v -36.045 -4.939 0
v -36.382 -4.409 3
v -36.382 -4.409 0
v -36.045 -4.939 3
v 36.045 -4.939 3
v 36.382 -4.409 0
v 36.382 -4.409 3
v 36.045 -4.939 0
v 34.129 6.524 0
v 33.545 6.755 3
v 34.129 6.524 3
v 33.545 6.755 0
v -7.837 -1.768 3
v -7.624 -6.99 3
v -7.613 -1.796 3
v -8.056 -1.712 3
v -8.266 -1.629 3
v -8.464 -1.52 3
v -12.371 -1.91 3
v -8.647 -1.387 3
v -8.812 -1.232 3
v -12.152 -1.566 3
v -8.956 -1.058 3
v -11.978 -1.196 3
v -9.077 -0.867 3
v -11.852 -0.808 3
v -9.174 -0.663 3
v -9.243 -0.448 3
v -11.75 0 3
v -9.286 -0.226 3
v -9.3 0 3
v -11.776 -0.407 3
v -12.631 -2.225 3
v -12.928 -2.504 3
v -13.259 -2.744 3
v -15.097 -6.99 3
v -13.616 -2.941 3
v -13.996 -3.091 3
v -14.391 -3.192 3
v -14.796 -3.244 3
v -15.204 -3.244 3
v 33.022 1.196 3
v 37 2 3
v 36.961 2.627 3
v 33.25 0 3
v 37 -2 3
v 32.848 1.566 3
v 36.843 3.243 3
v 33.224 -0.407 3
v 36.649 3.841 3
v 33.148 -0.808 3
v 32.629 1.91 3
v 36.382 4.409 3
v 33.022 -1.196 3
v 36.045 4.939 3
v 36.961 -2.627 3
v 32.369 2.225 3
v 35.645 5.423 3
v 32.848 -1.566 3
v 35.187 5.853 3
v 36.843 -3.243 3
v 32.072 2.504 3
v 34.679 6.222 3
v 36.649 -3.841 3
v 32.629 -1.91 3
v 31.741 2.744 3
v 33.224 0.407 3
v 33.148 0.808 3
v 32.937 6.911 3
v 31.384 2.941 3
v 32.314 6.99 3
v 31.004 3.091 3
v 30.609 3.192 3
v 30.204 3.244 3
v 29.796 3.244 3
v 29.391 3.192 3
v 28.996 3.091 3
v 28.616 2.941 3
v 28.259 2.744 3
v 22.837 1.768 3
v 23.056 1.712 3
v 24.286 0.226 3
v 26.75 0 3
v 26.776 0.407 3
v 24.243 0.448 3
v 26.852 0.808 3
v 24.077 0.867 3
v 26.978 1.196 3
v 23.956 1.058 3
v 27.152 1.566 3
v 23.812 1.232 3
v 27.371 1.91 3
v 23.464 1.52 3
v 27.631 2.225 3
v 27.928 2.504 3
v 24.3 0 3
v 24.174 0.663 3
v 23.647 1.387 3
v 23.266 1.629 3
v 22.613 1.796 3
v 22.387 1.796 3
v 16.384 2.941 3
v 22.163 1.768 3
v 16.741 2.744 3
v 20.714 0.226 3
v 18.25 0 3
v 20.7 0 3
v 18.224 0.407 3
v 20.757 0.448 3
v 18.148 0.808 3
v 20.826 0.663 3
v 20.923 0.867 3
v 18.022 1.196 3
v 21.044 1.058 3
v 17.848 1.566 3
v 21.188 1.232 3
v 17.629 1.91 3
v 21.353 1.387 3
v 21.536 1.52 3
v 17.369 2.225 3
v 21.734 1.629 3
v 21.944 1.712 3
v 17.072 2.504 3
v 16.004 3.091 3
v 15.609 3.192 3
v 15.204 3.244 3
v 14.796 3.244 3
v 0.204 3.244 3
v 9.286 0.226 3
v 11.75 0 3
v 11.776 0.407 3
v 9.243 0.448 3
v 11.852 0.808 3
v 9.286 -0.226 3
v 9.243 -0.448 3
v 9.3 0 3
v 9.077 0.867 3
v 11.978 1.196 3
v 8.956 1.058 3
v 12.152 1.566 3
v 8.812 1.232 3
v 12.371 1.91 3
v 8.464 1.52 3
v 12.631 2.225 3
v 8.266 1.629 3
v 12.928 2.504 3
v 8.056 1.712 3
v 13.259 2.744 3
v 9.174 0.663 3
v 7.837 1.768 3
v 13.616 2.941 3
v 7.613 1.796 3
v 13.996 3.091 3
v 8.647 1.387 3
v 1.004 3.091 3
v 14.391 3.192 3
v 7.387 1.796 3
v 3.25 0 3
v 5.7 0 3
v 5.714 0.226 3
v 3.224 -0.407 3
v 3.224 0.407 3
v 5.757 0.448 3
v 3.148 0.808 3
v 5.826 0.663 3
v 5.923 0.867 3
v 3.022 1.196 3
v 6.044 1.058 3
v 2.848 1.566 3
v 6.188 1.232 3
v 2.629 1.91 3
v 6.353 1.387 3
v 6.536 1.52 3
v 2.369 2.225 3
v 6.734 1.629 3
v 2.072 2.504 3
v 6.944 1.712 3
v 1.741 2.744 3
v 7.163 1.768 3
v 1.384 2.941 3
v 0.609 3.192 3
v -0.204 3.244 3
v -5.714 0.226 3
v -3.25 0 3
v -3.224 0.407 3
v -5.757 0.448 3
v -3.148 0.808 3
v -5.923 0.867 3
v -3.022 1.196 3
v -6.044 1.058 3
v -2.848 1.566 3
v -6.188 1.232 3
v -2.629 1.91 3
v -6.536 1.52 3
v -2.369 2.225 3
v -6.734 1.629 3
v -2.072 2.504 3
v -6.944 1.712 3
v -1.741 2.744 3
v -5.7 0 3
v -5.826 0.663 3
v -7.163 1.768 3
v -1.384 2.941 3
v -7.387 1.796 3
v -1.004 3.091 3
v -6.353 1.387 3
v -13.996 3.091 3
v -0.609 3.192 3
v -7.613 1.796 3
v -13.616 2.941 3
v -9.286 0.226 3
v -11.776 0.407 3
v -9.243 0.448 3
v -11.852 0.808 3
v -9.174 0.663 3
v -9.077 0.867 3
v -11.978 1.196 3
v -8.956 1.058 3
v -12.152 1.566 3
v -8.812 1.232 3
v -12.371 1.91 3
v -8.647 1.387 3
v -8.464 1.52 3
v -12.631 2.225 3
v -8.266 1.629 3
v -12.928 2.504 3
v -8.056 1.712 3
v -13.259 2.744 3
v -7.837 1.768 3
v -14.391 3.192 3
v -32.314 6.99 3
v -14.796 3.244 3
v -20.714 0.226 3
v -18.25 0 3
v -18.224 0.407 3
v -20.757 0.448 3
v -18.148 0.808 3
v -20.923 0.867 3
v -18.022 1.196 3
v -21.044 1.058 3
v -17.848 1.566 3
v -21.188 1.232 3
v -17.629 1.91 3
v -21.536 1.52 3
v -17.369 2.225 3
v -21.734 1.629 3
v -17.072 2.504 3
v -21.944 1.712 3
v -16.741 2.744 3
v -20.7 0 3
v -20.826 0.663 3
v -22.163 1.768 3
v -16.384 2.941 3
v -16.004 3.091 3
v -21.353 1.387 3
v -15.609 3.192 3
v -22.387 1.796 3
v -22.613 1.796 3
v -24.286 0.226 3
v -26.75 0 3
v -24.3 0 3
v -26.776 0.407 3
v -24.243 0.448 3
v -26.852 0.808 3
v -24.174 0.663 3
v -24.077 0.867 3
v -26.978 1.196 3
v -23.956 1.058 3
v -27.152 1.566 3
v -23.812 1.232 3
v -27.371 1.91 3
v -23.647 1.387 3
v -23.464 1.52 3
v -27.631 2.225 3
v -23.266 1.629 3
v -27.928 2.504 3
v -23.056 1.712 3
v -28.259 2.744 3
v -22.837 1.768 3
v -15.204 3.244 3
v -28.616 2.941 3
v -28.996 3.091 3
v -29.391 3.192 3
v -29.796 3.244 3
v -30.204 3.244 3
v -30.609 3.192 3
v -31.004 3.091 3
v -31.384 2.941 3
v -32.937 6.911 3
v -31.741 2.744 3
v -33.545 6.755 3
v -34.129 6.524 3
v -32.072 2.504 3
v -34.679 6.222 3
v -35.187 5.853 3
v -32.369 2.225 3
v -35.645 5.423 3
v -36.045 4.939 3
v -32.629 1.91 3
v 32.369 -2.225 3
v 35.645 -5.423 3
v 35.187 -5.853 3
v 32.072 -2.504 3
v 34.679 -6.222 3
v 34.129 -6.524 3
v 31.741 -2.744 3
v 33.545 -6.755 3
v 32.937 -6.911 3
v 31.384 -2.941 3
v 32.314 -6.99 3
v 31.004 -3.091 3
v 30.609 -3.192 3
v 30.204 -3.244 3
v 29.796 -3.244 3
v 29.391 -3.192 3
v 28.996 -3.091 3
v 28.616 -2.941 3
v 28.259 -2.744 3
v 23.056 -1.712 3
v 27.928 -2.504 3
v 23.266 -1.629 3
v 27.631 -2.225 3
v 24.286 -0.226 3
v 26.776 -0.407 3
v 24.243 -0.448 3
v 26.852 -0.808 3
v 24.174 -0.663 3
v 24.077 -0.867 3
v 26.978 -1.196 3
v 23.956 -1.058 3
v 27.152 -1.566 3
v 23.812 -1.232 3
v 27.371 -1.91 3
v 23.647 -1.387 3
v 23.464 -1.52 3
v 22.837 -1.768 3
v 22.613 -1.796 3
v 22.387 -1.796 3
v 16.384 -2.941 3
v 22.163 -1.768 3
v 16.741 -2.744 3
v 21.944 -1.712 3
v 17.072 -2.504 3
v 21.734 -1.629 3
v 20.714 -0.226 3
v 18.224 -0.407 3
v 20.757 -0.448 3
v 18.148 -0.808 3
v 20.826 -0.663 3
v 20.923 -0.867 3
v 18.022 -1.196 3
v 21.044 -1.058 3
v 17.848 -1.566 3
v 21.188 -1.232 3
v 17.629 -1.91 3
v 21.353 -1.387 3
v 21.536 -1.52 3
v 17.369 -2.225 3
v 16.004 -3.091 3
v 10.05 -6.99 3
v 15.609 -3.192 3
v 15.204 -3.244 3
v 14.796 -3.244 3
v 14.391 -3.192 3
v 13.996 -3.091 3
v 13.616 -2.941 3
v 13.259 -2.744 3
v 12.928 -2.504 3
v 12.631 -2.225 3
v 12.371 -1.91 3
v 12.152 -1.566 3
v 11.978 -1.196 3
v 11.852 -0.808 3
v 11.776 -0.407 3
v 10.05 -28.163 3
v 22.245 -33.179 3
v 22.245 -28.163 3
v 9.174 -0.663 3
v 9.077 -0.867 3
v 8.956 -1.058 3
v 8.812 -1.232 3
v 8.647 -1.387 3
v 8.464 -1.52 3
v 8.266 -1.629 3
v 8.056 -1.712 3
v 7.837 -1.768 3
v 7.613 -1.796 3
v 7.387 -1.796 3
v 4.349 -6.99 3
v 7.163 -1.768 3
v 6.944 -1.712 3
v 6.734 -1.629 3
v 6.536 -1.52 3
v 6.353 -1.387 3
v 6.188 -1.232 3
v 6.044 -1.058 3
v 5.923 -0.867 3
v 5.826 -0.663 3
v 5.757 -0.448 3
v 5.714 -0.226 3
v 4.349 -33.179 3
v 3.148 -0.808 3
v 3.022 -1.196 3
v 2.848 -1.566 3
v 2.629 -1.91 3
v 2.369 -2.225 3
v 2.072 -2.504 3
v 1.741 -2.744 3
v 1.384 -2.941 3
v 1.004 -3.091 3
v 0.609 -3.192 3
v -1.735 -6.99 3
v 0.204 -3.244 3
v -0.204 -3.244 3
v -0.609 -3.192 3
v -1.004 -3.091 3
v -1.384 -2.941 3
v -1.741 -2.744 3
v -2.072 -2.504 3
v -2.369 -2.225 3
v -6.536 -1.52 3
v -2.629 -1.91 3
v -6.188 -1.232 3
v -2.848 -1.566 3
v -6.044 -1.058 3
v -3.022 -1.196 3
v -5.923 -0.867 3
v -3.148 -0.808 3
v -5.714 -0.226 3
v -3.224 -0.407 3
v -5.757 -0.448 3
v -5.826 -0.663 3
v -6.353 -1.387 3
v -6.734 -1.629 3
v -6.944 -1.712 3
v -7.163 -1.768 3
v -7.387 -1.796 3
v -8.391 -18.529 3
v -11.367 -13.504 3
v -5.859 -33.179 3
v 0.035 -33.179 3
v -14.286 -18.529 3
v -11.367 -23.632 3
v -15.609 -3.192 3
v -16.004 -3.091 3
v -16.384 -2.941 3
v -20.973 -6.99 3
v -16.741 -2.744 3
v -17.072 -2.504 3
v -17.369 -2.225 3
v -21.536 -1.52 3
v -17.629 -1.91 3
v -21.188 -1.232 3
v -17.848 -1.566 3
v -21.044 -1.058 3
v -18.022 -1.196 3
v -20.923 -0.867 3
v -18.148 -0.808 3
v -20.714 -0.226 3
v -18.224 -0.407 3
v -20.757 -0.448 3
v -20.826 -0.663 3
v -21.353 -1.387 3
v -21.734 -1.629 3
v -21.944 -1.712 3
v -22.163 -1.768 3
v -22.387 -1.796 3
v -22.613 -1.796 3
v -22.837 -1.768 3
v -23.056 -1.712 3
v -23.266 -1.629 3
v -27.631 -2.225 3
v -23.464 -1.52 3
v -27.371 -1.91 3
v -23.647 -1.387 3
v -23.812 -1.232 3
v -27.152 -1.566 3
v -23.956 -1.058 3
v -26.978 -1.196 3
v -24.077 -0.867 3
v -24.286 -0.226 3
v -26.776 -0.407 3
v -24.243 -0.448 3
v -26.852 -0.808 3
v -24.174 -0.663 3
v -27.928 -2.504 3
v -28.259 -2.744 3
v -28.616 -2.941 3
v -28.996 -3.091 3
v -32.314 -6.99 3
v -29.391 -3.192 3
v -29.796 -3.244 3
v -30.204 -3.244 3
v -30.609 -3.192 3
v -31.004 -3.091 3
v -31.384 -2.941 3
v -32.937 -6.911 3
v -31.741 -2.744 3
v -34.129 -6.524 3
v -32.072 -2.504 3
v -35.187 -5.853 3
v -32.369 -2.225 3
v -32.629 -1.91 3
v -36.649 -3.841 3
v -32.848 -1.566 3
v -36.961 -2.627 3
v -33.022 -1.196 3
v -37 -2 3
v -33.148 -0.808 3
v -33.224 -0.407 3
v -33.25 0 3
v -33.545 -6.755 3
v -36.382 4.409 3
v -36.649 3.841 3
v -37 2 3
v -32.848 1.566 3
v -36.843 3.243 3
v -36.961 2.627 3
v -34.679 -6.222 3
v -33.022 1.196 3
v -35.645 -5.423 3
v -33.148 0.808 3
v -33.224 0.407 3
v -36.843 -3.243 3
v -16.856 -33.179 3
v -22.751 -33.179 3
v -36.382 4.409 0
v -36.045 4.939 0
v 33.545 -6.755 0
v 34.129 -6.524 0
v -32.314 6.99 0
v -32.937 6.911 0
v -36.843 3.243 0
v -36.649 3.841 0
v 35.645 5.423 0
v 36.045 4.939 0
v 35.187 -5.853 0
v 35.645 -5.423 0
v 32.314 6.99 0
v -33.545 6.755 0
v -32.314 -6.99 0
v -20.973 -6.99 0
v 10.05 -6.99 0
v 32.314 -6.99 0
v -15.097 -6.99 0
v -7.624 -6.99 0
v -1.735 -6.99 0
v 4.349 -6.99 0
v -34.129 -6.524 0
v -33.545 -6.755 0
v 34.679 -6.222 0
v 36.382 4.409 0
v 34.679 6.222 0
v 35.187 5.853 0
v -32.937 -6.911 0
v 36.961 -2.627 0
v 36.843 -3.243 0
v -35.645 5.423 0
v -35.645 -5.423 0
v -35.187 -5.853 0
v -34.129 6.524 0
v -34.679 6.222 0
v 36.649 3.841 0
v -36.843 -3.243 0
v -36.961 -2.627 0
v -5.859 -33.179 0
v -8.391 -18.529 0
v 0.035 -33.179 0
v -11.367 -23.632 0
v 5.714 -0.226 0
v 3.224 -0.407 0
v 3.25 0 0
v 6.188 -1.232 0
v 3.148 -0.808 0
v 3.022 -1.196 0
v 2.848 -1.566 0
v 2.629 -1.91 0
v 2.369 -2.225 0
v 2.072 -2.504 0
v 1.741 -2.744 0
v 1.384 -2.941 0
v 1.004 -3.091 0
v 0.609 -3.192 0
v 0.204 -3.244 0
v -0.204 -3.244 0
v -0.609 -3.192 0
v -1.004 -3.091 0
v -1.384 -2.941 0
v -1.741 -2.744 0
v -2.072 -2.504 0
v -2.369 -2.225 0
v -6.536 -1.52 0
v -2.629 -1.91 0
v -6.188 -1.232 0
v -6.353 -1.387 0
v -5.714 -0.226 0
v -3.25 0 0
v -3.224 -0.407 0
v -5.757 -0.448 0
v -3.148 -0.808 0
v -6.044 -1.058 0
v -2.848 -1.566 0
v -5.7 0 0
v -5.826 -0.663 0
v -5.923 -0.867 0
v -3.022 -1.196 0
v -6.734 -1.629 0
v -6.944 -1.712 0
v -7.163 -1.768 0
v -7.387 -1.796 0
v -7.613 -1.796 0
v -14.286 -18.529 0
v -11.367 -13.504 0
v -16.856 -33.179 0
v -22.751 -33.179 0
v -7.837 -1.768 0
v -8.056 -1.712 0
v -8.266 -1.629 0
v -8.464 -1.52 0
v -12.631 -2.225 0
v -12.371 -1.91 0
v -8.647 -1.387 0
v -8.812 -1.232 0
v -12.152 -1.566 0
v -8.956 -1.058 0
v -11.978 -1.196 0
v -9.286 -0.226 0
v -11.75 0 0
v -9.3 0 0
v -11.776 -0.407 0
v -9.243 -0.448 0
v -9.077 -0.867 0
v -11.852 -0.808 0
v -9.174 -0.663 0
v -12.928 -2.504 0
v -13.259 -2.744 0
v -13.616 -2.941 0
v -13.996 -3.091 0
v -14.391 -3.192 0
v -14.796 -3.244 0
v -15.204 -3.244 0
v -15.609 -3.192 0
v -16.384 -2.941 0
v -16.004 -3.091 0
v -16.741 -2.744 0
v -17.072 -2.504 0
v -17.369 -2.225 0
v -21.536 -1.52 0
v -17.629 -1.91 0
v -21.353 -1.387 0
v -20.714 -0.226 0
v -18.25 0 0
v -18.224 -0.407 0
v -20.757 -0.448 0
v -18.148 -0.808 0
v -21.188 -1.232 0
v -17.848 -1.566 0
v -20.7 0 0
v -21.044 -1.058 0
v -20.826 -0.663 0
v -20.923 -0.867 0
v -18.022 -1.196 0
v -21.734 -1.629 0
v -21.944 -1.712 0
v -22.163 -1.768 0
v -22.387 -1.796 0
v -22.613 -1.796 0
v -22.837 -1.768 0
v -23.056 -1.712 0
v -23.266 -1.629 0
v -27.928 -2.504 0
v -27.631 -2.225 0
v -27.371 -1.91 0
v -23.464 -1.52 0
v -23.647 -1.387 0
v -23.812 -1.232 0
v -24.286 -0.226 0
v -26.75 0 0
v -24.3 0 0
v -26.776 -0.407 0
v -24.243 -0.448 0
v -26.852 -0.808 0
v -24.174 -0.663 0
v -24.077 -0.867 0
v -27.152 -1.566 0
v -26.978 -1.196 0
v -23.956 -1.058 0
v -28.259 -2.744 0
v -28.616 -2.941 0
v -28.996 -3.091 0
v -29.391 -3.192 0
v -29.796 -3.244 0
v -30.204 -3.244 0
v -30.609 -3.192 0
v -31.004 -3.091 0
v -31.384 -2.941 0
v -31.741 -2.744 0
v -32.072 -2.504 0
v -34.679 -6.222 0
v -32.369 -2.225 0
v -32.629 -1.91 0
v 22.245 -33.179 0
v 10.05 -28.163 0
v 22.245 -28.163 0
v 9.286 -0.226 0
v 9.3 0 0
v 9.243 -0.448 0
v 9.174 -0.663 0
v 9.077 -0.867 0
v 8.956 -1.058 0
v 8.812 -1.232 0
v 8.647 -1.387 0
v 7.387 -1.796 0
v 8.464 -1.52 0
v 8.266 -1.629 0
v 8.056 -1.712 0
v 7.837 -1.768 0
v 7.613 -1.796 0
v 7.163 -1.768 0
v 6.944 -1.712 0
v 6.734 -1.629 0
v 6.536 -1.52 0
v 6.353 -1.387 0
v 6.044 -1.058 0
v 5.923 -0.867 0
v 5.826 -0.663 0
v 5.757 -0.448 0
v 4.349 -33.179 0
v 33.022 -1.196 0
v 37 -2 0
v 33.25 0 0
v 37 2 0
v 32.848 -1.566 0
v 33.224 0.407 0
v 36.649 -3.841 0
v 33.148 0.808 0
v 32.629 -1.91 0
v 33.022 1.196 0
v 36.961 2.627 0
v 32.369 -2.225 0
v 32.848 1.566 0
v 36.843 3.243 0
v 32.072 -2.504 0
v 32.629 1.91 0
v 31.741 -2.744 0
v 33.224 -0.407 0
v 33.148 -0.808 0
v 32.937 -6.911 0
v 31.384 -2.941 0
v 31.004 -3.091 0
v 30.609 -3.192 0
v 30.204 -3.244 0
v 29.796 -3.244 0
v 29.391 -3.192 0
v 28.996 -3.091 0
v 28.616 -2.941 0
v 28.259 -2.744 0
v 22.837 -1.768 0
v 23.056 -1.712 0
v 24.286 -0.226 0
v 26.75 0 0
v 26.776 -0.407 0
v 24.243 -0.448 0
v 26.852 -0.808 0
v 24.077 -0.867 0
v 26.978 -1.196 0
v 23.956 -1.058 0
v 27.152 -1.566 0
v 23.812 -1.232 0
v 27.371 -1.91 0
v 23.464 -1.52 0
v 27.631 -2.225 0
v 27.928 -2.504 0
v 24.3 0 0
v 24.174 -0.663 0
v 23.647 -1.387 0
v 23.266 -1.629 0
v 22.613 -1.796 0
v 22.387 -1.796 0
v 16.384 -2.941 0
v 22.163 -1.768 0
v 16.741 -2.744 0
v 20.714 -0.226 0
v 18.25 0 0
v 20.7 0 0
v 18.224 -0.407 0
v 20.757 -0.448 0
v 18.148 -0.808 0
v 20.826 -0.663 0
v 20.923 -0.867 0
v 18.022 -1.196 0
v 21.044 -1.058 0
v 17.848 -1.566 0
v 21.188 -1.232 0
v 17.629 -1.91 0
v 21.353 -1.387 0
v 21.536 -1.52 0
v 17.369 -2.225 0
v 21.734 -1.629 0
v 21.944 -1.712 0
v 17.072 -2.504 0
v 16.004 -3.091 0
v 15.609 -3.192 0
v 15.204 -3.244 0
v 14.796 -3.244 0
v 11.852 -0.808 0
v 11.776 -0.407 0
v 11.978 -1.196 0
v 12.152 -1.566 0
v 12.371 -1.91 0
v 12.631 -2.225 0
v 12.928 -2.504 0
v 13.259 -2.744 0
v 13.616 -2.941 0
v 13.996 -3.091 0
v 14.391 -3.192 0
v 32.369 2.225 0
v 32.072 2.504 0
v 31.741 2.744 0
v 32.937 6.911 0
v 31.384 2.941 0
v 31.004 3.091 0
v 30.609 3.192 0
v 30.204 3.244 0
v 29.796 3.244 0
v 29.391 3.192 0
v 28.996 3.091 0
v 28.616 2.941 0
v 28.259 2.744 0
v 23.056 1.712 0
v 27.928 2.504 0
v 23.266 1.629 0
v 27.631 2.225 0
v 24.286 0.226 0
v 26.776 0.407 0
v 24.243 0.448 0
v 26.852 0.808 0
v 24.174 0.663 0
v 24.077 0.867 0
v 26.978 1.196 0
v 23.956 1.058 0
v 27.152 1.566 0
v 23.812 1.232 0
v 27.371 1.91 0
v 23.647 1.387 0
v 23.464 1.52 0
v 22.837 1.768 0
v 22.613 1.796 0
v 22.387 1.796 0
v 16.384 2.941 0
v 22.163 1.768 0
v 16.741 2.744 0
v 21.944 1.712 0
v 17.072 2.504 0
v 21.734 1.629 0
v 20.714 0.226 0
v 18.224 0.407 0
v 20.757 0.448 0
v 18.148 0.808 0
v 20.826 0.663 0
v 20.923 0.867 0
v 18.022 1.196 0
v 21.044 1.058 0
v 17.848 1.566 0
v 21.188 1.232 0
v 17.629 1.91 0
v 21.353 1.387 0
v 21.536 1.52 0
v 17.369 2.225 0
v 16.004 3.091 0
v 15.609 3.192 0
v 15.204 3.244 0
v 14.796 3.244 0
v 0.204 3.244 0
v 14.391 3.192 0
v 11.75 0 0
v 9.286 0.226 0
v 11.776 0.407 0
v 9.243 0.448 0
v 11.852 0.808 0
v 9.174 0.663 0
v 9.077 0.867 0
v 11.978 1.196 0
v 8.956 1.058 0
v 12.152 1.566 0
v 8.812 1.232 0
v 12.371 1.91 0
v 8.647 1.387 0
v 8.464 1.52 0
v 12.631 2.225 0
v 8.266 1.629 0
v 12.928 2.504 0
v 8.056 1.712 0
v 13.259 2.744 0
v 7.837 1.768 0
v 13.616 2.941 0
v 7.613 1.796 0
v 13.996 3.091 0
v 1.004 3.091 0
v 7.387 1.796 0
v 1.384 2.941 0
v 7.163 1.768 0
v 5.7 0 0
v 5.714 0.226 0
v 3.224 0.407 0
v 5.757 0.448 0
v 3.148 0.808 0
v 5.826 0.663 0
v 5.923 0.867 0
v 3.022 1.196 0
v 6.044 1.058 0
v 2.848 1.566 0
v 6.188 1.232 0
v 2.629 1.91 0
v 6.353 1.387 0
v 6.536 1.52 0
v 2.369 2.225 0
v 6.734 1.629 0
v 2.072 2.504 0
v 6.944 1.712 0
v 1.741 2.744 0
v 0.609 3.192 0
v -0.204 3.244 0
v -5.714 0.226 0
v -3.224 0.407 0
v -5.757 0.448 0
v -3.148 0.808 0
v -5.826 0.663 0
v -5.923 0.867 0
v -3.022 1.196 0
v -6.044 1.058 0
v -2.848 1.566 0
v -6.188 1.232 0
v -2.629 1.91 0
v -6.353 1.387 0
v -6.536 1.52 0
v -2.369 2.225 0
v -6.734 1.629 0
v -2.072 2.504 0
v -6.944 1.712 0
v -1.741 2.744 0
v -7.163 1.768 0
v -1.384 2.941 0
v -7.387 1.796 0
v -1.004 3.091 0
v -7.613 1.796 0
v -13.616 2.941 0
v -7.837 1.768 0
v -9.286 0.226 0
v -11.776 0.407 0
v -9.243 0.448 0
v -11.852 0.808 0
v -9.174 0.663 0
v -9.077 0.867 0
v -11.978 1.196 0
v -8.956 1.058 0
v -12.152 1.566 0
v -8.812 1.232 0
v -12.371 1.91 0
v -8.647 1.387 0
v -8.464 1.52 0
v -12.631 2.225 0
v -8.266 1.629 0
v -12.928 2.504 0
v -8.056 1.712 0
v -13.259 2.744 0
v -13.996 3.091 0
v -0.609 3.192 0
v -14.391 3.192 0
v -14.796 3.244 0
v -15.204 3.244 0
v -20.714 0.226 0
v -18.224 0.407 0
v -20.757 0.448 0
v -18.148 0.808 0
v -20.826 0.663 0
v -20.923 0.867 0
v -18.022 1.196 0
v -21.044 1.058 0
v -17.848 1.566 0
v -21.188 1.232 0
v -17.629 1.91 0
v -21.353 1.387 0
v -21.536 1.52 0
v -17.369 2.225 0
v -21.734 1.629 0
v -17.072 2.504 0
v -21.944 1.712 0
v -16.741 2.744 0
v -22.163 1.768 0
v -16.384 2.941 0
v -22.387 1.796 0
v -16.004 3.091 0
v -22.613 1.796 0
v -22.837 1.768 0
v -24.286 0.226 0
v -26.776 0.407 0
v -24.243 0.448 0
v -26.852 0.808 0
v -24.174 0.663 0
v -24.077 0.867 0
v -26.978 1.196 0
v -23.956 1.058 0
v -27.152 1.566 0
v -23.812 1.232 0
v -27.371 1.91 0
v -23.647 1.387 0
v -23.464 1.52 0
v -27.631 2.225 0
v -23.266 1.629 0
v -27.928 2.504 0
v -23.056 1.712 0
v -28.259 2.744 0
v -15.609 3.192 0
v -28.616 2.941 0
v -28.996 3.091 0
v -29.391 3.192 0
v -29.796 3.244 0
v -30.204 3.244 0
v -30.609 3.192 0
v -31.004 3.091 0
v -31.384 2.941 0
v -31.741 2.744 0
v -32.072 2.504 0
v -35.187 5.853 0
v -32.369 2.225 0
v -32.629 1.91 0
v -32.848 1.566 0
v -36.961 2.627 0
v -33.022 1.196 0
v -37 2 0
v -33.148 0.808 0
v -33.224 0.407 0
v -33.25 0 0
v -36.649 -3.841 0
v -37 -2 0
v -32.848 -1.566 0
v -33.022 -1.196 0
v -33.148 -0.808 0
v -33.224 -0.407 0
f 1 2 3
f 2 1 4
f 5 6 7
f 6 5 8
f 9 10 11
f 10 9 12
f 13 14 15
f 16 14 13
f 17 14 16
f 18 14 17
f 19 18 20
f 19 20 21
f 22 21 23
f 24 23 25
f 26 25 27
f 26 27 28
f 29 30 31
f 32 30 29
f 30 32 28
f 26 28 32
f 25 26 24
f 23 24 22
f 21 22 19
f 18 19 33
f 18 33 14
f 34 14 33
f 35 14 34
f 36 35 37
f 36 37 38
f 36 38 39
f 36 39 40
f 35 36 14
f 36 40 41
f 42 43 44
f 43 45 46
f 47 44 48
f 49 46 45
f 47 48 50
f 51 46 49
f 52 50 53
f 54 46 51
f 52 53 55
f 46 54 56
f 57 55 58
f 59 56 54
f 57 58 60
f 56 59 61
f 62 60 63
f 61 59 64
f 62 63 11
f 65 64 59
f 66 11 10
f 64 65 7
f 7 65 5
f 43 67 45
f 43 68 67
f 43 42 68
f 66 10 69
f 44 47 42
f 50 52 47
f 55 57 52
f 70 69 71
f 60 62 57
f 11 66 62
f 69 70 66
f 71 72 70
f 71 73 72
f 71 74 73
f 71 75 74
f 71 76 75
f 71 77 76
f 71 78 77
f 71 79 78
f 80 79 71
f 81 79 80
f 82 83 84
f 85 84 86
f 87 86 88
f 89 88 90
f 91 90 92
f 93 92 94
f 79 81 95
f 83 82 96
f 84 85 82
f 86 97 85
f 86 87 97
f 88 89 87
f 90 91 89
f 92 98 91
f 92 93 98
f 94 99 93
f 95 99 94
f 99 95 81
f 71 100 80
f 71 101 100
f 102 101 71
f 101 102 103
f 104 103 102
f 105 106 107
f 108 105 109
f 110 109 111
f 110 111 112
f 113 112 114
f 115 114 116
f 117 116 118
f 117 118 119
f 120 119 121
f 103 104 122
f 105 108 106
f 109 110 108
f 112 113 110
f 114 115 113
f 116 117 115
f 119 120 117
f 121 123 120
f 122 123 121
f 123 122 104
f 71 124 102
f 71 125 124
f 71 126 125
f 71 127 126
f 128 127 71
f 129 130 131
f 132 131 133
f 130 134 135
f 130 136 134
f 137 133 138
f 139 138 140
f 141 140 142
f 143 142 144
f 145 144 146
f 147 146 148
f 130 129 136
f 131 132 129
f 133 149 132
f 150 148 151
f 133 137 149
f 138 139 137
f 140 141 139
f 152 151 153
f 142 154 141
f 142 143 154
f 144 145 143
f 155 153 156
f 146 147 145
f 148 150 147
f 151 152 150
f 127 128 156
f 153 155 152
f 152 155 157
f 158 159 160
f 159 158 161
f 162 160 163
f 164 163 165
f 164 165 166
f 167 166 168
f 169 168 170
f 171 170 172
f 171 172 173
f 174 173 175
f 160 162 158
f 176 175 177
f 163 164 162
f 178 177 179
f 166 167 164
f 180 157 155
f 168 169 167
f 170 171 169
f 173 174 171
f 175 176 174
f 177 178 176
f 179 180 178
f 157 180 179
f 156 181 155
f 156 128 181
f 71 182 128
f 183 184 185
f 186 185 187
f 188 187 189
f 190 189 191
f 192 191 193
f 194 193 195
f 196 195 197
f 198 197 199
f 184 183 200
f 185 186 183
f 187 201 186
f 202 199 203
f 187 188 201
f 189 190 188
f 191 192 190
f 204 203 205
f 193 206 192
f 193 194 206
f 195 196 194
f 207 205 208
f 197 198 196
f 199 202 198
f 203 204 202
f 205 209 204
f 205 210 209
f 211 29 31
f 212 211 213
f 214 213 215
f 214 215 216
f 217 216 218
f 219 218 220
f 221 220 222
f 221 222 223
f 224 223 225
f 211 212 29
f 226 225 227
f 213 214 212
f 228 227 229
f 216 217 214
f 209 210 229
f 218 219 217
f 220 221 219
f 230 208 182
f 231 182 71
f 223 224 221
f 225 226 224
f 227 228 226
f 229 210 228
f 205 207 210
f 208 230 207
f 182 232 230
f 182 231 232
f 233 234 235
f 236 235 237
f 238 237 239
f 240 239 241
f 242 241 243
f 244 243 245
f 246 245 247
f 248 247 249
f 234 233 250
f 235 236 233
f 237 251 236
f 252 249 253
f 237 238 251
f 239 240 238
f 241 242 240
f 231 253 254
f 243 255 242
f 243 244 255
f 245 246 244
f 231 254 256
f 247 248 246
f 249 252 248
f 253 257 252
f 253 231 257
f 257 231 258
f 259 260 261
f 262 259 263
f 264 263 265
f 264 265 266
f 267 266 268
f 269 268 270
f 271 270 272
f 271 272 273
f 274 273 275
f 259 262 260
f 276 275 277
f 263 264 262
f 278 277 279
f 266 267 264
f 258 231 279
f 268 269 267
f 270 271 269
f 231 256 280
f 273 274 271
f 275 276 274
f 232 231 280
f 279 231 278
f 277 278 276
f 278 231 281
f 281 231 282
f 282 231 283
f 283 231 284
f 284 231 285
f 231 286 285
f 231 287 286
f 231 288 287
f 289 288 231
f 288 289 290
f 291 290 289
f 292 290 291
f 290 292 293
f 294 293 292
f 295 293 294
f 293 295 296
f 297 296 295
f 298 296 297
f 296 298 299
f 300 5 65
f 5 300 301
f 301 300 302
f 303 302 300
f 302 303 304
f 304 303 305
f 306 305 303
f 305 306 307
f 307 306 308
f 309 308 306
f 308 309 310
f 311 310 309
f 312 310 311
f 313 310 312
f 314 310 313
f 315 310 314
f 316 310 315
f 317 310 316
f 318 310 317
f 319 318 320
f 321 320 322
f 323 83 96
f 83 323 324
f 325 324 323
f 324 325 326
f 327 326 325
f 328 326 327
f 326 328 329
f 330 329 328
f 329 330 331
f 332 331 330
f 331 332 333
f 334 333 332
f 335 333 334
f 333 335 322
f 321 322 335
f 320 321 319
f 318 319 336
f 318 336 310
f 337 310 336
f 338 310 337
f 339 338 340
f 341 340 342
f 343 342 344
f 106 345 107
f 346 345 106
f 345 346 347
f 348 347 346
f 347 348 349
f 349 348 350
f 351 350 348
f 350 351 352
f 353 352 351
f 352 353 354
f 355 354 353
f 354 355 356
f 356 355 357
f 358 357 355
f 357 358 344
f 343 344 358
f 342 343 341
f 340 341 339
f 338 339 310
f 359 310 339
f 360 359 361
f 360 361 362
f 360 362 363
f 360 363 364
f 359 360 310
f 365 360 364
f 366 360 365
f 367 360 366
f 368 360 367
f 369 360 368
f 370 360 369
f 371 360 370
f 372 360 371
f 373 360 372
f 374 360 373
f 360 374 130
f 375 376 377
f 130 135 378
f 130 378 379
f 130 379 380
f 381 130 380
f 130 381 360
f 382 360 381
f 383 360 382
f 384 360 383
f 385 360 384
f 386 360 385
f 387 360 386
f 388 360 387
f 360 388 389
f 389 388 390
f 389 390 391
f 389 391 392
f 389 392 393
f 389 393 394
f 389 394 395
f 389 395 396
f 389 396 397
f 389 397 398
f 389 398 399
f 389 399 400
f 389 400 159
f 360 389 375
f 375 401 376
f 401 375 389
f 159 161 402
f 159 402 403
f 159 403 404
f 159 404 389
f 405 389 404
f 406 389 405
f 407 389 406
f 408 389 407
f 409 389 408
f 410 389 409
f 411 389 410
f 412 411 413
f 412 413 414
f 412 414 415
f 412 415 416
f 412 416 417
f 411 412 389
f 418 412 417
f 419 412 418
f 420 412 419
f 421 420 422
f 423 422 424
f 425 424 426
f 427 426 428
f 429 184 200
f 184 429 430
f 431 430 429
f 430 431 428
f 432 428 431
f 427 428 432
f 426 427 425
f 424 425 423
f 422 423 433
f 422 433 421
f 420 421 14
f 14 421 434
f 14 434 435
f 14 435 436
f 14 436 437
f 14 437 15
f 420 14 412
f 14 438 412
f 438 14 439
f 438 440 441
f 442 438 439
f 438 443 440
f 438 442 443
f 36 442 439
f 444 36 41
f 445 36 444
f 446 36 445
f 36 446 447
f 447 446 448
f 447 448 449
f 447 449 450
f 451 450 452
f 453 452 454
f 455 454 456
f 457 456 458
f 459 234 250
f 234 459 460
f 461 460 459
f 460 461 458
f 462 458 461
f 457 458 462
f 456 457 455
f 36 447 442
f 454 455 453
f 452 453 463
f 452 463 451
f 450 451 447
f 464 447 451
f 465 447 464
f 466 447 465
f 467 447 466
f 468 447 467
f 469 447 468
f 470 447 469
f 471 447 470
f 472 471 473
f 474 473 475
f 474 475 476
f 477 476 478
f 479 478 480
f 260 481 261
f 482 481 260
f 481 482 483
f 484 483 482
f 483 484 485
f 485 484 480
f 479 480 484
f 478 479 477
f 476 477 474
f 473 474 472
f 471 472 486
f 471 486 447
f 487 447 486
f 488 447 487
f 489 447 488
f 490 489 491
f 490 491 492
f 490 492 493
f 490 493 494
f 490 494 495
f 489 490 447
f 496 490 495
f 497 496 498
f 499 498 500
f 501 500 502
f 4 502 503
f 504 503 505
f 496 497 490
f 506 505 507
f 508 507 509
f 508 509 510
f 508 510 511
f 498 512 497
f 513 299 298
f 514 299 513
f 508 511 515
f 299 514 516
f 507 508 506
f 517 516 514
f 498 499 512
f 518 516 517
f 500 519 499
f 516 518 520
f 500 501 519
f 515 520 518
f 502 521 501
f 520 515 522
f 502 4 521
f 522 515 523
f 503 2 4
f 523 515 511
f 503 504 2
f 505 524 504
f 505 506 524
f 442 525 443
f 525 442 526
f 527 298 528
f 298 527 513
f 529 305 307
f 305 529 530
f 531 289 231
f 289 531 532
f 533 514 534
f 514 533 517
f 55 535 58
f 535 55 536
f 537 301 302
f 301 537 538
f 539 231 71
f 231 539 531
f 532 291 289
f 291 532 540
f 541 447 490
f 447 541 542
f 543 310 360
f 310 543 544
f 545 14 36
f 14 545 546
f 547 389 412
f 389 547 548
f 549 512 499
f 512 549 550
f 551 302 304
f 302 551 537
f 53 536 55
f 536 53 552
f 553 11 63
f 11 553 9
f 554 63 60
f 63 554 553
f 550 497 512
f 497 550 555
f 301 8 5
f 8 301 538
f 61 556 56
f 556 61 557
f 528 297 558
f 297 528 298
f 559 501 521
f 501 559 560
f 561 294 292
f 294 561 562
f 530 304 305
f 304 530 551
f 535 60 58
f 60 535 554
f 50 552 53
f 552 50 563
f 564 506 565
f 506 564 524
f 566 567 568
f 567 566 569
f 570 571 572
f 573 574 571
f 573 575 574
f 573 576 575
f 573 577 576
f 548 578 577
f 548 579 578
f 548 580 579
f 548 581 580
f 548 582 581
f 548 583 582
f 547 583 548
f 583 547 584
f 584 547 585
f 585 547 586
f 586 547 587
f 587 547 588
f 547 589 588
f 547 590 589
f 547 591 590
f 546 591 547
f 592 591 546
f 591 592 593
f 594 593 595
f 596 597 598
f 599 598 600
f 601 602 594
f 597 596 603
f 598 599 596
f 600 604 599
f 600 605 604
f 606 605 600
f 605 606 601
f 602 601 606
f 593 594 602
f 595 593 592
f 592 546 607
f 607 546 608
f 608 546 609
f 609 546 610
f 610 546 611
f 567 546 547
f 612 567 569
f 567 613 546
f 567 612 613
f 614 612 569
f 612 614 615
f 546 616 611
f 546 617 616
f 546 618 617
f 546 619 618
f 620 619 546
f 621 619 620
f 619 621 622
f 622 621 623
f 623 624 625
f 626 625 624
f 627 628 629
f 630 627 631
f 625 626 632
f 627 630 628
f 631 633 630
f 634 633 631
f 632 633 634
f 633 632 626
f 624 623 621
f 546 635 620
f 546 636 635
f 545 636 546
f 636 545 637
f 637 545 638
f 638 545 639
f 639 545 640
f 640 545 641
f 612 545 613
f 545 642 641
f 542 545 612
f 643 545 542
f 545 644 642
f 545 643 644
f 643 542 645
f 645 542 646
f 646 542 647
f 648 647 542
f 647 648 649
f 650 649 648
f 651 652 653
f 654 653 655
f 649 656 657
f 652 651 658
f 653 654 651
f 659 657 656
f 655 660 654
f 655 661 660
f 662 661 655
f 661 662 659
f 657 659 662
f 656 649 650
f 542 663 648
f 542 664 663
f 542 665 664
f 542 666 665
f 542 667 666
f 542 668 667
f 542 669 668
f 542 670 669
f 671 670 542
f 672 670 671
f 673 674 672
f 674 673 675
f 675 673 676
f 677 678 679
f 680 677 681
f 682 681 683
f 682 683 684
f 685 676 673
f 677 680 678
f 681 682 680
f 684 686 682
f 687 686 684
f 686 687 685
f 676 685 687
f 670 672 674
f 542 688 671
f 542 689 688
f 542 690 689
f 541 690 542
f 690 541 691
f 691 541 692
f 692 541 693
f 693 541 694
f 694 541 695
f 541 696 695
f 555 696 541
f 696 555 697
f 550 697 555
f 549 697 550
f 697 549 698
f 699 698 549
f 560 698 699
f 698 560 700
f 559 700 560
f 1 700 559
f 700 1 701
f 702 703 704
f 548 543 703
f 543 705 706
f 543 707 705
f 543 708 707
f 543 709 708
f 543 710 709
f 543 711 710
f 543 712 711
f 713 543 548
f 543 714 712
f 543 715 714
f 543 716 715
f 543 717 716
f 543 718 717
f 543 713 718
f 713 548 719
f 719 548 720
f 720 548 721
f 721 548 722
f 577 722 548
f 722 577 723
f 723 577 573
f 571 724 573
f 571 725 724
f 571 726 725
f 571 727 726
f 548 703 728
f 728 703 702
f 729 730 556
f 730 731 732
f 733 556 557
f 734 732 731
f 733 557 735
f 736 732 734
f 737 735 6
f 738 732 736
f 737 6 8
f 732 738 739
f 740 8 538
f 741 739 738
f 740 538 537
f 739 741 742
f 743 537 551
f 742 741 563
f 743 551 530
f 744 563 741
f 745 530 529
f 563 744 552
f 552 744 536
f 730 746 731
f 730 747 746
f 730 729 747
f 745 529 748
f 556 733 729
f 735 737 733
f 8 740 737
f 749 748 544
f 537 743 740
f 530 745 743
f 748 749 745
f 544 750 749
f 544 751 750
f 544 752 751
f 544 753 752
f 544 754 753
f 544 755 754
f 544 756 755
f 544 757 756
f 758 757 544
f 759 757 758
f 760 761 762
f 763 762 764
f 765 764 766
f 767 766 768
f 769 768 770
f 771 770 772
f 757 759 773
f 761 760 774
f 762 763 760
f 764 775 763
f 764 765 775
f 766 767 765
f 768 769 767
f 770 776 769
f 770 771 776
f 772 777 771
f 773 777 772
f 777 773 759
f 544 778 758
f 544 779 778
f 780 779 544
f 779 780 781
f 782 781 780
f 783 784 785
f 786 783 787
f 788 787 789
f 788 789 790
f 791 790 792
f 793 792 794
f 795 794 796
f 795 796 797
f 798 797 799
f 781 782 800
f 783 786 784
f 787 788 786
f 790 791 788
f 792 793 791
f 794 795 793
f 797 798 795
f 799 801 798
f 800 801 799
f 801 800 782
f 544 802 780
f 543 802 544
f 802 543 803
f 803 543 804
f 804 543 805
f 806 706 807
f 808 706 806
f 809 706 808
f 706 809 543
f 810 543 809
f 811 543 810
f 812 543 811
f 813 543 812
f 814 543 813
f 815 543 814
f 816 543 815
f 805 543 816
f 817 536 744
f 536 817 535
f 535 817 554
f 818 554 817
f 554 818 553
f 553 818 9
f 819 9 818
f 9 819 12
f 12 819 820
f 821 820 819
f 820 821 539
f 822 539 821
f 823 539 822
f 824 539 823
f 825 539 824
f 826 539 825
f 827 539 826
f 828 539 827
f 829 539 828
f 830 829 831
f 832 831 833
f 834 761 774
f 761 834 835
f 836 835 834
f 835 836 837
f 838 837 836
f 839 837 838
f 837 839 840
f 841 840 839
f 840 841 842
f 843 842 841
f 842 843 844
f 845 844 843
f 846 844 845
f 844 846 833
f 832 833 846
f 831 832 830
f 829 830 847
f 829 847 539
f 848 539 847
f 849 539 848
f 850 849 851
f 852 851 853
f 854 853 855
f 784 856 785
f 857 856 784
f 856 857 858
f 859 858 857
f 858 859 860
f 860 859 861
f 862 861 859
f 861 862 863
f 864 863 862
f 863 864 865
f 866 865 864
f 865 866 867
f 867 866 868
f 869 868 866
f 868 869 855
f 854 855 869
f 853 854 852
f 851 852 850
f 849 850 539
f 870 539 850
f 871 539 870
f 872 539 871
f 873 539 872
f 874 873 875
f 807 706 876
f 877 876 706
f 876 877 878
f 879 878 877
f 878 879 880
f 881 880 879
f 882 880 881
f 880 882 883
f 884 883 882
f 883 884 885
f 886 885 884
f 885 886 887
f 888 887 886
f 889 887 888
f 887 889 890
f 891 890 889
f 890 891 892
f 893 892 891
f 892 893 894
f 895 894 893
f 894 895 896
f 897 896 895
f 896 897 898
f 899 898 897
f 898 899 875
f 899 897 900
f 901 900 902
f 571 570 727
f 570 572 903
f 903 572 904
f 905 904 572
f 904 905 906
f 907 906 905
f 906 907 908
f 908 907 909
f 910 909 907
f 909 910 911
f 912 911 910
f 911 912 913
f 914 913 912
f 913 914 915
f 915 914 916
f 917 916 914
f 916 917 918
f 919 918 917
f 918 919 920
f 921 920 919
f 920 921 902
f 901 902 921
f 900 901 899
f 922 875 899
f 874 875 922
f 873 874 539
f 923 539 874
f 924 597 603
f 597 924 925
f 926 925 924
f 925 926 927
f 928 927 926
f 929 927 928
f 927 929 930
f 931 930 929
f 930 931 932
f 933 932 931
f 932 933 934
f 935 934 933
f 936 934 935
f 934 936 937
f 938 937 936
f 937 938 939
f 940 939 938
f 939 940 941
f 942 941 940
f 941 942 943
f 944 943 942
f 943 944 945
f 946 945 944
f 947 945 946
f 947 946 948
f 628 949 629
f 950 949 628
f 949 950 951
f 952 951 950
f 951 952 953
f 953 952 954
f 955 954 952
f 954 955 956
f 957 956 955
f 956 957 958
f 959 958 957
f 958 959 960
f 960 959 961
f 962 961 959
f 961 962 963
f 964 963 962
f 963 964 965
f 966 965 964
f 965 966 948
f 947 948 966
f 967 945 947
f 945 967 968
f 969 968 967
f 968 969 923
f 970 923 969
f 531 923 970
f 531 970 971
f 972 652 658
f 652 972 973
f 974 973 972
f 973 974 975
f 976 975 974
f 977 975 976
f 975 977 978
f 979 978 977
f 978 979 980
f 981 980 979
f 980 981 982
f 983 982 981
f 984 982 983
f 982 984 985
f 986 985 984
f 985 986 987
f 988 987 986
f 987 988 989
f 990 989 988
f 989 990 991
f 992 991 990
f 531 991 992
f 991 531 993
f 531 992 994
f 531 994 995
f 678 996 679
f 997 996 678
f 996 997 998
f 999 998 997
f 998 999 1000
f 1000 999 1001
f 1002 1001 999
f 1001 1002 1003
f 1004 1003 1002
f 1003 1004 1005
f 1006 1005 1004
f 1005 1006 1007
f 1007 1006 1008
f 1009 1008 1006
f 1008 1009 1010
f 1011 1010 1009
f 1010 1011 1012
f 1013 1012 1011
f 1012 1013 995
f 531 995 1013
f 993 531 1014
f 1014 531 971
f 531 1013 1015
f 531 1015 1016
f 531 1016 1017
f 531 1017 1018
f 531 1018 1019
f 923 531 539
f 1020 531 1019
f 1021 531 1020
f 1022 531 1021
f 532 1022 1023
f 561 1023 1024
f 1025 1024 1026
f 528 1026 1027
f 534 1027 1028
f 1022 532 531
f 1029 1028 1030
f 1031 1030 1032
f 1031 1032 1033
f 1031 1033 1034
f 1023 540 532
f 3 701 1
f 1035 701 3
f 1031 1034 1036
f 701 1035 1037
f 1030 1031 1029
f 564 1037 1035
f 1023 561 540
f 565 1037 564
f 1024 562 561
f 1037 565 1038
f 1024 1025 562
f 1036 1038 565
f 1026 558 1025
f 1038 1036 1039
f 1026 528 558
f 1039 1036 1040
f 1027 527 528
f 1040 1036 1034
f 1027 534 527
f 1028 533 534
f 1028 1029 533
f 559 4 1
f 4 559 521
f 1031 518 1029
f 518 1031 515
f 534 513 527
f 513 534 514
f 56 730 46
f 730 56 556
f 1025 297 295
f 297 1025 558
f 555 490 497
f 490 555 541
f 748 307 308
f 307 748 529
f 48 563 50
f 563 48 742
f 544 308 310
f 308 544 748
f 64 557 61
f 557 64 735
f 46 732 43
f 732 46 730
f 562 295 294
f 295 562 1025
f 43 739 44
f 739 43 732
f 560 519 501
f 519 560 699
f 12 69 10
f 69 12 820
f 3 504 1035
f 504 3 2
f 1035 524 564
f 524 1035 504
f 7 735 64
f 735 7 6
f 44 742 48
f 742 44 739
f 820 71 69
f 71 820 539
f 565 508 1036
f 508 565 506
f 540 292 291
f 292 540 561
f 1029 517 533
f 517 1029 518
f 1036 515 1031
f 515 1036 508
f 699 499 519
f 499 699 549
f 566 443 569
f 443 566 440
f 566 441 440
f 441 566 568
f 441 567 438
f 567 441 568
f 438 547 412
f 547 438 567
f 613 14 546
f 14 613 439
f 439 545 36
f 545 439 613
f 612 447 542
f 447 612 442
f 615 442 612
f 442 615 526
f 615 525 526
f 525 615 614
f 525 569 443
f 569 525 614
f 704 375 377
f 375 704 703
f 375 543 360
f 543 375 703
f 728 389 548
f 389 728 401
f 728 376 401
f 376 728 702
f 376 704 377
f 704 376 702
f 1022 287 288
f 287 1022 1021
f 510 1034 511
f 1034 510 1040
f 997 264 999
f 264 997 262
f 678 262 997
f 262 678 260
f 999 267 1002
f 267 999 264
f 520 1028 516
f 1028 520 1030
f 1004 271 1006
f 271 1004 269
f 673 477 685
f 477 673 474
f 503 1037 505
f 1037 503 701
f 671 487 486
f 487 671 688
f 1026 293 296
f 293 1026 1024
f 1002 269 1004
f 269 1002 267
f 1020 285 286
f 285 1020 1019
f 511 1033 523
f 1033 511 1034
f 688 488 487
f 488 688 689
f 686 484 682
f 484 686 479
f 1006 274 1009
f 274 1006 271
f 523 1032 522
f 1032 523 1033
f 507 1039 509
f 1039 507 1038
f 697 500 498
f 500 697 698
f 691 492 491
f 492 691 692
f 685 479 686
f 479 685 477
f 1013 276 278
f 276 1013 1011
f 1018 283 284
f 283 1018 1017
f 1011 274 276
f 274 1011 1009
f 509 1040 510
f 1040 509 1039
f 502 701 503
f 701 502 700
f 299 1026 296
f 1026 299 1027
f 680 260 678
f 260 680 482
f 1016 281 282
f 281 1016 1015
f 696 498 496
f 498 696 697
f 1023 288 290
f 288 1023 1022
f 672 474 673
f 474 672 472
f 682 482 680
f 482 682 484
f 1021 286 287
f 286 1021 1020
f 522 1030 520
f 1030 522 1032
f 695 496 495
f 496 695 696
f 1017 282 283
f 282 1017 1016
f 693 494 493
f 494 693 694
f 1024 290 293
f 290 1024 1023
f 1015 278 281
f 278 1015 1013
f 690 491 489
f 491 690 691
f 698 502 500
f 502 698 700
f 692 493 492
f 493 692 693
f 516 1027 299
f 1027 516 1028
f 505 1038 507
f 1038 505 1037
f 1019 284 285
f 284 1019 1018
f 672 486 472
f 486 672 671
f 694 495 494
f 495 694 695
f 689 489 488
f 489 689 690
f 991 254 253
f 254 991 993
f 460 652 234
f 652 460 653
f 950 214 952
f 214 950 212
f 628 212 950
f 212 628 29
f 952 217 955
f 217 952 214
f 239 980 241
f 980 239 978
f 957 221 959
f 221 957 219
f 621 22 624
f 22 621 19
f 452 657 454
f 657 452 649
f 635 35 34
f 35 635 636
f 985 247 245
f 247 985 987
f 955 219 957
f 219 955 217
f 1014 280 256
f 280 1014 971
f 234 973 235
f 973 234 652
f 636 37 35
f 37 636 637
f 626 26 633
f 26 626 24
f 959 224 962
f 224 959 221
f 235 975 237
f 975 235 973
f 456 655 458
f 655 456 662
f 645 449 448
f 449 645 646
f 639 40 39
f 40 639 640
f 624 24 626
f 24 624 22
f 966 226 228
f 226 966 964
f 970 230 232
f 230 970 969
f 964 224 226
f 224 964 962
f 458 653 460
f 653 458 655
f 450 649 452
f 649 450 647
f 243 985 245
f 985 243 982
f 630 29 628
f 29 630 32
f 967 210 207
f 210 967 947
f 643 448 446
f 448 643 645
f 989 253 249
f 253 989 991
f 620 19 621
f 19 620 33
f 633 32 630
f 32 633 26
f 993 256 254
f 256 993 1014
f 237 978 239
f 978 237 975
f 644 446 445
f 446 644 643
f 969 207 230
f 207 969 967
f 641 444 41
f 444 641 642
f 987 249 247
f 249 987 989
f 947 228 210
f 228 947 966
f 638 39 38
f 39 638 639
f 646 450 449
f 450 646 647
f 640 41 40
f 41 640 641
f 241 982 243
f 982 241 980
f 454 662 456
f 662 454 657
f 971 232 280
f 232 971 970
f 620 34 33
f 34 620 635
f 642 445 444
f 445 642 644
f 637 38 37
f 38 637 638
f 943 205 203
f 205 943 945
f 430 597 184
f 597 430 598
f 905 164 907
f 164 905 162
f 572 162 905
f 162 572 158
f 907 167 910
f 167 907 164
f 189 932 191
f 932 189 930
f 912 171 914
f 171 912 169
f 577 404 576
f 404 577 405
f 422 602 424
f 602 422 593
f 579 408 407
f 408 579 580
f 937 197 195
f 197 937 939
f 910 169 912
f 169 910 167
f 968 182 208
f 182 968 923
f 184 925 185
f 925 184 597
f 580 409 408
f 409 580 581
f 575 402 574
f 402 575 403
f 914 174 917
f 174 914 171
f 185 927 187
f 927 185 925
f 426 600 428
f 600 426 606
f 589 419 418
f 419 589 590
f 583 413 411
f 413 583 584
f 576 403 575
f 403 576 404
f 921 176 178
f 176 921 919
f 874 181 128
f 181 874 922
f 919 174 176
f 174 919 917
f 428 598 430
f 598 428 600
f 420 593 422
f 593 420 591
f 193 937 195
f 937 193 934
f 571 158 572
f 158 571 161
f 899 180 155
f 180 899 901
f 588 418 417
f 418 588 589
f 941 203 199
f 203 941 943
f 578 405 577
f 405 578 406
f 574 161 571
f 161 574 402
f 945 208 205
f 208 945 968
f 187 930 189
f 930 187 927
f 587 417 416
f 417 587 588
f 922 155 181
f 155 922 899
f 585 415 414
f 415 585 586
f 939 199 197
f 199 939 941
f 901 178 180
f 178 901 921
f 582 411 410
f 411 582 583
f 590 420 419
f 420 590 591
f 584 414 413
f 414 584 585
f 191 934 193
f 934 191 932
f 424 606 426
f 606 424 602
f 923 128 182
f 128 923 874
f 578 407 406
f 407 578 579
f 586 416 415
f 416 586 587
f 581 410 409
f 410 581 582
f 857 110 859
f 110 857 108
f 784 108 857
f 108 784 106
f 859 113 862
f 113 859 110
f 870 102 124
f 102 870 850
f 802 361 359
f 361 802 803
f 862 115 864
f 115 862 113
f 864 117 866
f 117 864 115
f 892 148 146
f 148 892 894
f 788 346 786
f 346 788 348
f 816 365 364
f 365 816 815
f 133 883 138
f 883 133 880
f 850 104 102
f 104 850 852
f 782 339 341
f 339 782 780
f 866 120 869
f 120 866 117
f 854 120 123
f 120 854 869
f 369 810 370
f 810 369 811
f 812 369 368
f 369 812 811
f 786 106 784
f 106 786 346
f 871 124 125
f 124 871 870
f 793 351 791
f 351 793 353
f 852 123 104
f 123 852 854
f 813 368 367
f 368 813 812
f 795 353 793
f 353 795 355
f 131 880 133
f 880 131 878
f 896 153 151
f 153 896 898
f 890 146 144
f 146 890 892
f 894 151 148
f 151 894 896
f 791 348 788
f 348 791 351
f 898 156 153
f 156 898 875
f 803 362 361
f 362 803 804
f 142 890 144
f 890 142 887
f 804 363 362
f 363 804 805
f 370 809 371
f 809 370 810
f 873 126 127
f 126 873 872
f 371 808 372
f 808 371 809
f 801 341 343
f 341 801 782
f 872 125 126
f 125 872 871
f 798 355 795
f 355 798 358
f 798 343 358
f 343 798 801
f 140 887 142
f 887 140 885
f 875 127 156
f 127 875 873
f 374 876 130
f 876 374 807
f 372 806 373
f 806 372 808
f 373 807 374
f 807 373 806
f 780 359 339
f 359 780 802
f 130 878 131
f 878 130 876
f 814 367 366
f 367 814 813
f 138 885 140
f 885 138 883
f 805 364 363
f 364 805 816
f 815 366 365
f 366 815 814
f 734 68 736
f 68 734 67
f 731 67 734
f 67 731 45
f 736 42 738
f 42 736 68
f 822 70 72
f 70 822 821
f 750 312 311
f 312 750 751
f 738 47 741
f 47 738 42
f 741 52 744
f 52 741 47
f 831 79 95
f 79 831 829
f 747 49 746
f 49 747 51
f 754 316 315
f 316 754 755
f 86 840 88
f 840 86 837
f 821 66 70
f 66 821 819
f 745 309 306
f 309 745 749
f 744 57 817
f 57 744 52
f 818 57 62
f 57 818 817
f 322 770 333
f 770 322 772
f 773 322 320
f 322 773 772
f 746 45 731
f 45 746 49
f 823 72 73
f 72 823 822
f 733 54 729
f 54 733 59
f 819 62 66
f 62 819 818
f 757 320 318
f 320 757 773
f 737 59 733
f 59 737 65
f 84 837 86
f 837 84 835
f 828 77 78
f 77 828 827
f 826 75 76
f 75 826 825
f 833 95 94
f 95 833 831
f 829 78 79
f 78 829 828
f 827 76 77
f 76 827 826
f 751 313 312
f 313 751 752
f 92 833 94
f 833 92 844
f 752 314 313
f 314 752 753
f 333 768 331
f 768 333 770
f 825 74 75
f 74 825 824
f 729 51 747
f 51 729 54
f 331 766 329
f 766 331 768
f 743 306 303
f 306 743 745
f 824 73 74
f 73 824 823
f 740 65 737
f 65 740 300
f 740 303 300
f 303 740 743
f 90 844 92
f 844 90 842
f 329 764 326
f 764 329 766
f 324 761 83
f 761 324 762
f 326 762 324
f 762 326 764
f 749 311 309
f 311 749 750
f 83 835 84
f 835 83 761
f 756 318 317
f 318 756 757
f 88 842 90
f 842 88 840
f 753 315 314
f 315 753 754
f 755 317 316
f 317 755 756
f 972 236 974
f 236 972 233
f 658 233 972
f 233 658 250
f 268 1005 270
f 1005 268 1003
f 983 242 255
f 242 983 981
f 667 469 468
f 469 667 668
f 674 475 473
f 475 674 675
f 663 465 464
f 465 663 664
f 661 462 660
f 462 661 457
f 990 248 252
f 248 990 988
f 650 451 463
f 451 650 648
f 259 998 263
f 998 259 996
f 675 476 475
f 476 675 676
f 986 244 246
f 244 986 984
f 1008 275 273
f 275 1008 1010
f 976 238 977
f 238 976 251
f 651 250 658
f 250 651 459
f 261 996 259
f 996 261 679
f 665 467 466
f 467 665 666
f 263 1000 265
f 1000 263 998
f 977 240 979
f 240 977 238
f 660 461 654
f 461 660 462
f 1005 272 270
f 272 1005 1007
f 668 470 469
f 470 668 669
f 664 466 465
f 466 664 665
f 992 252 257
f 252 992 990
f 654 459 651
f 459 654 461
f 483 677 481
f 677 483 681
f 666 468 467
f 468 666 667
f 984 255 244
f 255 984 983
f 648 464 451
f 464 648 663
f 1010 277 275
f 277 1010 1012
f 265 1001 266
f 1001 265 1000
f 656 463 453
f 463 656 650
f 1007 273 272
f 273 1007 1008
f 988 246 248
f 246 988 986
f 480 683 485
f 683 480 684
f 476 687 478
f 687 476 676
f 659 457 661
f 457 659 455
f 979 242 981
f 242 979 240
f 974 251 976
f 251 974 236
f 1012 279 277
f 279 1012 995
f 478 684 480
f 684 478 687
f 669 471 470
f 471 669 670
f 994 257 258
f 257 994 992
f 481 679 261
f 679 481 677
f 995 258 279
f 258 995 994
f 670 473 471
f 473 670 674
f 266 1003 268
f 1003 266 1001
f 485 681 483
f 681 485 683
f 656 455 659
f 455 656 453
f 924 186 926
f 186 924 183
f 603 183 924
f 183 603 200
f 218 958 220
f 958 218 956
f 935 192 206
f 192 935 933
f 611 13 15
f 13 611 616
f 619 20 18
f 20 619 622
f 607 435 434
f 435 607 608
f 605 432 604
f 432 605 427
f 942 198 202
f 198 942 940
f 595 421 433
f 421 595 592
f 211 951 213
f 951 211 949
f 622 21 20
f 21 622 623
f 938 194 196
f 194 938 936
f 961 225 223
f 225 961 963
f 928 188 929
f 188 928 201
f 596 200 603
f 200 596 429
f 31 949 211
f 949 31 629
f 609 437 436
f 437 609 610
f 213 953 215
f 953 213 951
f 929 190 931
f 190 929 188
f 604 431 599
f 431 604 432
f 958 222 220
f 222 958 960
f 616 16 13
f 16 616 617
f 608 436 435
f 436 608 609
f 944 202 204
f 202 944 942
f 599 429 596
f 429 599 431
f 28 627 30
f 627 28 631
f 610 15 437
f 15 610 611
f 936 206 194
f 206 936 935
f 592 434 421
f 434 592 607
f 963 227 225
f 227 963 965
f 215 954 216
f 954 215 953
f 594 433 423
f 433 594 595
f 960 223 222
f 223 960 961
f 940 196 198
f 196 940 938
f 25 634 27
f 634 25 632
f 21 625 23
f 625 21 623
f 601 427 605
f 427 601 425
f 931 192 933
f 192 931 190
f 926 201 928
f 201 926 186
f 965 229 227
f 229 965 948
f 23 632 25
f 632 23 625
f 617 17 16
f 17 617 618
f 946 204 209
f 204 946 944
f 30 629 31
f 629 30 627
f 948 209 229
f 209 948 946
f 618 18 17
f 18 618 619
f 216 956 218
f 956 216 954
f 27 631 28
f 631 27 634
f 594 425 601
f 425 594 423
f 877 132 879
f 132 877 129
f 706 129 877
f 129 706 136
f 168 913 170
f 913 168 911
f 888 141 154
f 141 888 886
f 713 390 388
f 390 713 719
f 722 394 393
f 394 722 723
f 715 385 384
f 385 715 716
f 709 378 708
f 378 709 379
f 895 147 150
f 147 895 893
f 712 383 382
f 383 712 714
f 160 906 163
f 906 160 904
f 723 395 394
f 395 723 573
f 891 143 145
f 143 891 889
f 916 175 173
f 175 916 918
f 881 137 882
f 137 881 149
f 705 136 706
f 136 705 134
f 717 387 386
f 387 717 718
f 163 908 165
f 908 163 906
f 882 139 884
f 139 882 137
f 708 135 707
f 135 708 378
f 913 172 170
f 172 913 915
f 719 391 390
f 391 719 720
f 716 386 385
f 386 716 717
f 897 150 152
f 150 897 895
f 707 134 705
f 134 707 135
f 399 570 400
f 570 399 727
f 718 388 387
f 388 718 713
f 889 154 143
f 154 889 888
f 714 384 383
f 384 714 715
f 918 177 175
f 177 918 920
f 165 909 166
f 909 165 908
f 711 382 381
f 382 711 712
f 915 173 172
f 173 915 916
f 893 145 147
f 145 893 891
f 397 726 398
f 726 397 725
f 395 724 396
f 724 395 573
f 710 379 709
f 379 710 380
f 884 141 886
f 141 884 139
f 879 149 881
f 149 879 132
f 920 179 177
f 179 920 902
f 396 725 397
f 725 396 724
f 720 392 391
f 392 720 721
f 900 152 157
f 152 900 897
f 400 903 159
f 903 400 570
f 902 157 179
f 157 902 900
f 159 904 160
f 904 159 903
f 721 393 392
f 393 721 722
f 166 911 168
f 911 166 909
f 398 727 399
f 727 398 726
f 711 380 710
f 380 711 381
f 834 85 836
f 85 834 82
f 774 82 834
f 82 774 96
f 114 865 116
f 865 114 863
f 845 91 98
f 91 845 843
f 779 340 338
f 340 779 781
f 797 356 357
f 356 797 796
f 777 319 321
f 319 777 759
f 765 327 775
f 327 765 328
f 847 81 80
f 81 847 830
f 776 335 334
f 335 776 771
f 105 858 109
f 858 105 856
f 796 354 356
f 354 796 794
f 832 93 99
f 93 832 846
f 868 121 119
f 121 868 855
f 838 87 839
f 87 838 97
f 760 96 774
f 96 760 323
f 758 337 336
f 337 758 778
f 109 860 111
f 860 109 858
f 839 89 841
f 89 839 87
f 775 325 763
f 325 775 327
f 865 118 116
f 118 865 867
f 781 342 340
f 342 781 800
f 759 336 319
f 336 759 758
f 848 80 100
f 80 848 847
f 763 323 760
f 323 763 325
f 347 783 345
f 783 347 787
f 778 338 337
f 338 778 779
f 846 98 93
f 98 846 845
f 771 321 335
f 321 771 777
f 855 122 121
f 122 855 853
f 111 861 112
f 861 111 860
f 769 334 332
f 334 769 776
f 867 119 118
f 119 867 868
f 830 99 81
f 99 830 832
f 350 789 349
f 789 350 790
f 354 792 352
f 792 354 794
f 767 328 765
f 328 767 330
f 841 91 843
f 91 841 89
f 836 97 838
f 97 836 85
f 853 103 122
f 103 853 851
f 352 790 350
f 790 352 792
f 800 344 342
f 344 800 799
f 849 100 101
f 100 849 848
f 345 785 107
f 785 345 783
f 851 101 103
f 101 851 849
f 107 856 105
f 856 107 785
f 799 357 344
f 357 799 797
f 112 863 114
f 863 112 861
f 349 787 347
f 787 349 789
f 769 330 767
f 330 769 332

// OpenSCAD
$fn = 50;


difference() {
	union() {
		hull() {
			translate(v = [-32.0000000000, 2.0000000000, 0]) {
				cylinder(h = 3, r = 5);
			}
			translate(v = [32.0000000000, 2.0000000000, 0]) {
				cylinder(h = 3, r = 5);
			}
			translate(v = [-32.0000000000, -2.0000000000, 0]) {
				cylinder(h = 3, r = 5);
			}
			translate(v = [32.0000000000, -2.0000000000, 0]) {
				cylinder(h = 3, r = 5);
			}
		}
		translate(v = [0, -5, 0]) {
			linear_extrude(height = 3) {
				text(font = "DejaVu Sans Mono:style=Bold", halign = "center", size = 28.5000000000, text = "XL", valign = "top");
			}
		}
	}
	union() {
		translate(v = [-30.0000000000, 0.0000000000, 0]) {
			translate(v = [0, 0, -100]) {
				cylinder(h = 200, r = 3.2500000000);
			}
		}
		translate(v = [-15.0000000000, 0.0000000000, 0]) {
			translate(v = [0, 0, -100]) {
				cylinder(h = 200, r = 3.2500000000);
			}
		}
		translate(v = [0, 0, -100]) {
			cylinder(h = 200, r = 3.2500000000);
		}
		translate(v = [15.0000000000, 0.0000000000, 0]) {
			translate(v = [0, 0, -100]) {
				cylinder(h = 200, r = 3.2500000000);
			}
		}
		translate(v = [30.0000000000, 0.0000000000, 0]) {
			translate(v = [0, 0, -100]) {
				cylinder(h = 200, r = 3.2500000000);
			}
		}
		translate(v = [-30.0000000000, 0.0000000000, 0]) {
			translate(v = [0, 0, -100]) {
				cylinder(h = 200, r = 1.8000000000);
			}
		}
		translate(v = [-22.5000000000, 0.0000000000, 0]) {
			translate(v = [0, 0, -100]) {
				cylinder(h = 200, r = 1.8000000000);
			}
		}
		translate(v = [-15.0000000000, 0.0000000000, 0]) {
			translate(v = [0, 0, -100]) {
				cylinder(h = 200, r = 1.8000000000);
			}
		}
		translate(v = [-7.5000000000, 0.0000000000, 0]) {
			translate(v = [0, 0, -100]) {
				cylinder(h = 200, r = 1.8000000000);
			}
		}
		translate(v = [0, 0, -100]) {
			cylinder(h = 200, r = 1.8000000000);
		}
		translate(v = [7.5000000000, 0.0000000000, 0]) {
			translate(v = [0, 0, -100]) {
				cylinder(h = 200, r = 1.8000000000);
			}
		}
		translate(v = [15.0000000000, 0.0000000000, 0]) {
			translate(v = [0, 0, -100]) {
				cylinder(h = 200, r = 1.8000000000);
			}
		}
		translate(v = [22.5000000000, 0.0000000000, 0]) {
			translate(v = [0, 0, -100]) {
				cylinder(h = 200, r = 1.8000000000);
			}
		}
		translate(v = [30.0000000000, 0.0000000000, 0]) {
			translate(v = [0, 0, -100]) {
				cylinder(h = 200, r = 1.8000000000);
			}
		}
	}
}
